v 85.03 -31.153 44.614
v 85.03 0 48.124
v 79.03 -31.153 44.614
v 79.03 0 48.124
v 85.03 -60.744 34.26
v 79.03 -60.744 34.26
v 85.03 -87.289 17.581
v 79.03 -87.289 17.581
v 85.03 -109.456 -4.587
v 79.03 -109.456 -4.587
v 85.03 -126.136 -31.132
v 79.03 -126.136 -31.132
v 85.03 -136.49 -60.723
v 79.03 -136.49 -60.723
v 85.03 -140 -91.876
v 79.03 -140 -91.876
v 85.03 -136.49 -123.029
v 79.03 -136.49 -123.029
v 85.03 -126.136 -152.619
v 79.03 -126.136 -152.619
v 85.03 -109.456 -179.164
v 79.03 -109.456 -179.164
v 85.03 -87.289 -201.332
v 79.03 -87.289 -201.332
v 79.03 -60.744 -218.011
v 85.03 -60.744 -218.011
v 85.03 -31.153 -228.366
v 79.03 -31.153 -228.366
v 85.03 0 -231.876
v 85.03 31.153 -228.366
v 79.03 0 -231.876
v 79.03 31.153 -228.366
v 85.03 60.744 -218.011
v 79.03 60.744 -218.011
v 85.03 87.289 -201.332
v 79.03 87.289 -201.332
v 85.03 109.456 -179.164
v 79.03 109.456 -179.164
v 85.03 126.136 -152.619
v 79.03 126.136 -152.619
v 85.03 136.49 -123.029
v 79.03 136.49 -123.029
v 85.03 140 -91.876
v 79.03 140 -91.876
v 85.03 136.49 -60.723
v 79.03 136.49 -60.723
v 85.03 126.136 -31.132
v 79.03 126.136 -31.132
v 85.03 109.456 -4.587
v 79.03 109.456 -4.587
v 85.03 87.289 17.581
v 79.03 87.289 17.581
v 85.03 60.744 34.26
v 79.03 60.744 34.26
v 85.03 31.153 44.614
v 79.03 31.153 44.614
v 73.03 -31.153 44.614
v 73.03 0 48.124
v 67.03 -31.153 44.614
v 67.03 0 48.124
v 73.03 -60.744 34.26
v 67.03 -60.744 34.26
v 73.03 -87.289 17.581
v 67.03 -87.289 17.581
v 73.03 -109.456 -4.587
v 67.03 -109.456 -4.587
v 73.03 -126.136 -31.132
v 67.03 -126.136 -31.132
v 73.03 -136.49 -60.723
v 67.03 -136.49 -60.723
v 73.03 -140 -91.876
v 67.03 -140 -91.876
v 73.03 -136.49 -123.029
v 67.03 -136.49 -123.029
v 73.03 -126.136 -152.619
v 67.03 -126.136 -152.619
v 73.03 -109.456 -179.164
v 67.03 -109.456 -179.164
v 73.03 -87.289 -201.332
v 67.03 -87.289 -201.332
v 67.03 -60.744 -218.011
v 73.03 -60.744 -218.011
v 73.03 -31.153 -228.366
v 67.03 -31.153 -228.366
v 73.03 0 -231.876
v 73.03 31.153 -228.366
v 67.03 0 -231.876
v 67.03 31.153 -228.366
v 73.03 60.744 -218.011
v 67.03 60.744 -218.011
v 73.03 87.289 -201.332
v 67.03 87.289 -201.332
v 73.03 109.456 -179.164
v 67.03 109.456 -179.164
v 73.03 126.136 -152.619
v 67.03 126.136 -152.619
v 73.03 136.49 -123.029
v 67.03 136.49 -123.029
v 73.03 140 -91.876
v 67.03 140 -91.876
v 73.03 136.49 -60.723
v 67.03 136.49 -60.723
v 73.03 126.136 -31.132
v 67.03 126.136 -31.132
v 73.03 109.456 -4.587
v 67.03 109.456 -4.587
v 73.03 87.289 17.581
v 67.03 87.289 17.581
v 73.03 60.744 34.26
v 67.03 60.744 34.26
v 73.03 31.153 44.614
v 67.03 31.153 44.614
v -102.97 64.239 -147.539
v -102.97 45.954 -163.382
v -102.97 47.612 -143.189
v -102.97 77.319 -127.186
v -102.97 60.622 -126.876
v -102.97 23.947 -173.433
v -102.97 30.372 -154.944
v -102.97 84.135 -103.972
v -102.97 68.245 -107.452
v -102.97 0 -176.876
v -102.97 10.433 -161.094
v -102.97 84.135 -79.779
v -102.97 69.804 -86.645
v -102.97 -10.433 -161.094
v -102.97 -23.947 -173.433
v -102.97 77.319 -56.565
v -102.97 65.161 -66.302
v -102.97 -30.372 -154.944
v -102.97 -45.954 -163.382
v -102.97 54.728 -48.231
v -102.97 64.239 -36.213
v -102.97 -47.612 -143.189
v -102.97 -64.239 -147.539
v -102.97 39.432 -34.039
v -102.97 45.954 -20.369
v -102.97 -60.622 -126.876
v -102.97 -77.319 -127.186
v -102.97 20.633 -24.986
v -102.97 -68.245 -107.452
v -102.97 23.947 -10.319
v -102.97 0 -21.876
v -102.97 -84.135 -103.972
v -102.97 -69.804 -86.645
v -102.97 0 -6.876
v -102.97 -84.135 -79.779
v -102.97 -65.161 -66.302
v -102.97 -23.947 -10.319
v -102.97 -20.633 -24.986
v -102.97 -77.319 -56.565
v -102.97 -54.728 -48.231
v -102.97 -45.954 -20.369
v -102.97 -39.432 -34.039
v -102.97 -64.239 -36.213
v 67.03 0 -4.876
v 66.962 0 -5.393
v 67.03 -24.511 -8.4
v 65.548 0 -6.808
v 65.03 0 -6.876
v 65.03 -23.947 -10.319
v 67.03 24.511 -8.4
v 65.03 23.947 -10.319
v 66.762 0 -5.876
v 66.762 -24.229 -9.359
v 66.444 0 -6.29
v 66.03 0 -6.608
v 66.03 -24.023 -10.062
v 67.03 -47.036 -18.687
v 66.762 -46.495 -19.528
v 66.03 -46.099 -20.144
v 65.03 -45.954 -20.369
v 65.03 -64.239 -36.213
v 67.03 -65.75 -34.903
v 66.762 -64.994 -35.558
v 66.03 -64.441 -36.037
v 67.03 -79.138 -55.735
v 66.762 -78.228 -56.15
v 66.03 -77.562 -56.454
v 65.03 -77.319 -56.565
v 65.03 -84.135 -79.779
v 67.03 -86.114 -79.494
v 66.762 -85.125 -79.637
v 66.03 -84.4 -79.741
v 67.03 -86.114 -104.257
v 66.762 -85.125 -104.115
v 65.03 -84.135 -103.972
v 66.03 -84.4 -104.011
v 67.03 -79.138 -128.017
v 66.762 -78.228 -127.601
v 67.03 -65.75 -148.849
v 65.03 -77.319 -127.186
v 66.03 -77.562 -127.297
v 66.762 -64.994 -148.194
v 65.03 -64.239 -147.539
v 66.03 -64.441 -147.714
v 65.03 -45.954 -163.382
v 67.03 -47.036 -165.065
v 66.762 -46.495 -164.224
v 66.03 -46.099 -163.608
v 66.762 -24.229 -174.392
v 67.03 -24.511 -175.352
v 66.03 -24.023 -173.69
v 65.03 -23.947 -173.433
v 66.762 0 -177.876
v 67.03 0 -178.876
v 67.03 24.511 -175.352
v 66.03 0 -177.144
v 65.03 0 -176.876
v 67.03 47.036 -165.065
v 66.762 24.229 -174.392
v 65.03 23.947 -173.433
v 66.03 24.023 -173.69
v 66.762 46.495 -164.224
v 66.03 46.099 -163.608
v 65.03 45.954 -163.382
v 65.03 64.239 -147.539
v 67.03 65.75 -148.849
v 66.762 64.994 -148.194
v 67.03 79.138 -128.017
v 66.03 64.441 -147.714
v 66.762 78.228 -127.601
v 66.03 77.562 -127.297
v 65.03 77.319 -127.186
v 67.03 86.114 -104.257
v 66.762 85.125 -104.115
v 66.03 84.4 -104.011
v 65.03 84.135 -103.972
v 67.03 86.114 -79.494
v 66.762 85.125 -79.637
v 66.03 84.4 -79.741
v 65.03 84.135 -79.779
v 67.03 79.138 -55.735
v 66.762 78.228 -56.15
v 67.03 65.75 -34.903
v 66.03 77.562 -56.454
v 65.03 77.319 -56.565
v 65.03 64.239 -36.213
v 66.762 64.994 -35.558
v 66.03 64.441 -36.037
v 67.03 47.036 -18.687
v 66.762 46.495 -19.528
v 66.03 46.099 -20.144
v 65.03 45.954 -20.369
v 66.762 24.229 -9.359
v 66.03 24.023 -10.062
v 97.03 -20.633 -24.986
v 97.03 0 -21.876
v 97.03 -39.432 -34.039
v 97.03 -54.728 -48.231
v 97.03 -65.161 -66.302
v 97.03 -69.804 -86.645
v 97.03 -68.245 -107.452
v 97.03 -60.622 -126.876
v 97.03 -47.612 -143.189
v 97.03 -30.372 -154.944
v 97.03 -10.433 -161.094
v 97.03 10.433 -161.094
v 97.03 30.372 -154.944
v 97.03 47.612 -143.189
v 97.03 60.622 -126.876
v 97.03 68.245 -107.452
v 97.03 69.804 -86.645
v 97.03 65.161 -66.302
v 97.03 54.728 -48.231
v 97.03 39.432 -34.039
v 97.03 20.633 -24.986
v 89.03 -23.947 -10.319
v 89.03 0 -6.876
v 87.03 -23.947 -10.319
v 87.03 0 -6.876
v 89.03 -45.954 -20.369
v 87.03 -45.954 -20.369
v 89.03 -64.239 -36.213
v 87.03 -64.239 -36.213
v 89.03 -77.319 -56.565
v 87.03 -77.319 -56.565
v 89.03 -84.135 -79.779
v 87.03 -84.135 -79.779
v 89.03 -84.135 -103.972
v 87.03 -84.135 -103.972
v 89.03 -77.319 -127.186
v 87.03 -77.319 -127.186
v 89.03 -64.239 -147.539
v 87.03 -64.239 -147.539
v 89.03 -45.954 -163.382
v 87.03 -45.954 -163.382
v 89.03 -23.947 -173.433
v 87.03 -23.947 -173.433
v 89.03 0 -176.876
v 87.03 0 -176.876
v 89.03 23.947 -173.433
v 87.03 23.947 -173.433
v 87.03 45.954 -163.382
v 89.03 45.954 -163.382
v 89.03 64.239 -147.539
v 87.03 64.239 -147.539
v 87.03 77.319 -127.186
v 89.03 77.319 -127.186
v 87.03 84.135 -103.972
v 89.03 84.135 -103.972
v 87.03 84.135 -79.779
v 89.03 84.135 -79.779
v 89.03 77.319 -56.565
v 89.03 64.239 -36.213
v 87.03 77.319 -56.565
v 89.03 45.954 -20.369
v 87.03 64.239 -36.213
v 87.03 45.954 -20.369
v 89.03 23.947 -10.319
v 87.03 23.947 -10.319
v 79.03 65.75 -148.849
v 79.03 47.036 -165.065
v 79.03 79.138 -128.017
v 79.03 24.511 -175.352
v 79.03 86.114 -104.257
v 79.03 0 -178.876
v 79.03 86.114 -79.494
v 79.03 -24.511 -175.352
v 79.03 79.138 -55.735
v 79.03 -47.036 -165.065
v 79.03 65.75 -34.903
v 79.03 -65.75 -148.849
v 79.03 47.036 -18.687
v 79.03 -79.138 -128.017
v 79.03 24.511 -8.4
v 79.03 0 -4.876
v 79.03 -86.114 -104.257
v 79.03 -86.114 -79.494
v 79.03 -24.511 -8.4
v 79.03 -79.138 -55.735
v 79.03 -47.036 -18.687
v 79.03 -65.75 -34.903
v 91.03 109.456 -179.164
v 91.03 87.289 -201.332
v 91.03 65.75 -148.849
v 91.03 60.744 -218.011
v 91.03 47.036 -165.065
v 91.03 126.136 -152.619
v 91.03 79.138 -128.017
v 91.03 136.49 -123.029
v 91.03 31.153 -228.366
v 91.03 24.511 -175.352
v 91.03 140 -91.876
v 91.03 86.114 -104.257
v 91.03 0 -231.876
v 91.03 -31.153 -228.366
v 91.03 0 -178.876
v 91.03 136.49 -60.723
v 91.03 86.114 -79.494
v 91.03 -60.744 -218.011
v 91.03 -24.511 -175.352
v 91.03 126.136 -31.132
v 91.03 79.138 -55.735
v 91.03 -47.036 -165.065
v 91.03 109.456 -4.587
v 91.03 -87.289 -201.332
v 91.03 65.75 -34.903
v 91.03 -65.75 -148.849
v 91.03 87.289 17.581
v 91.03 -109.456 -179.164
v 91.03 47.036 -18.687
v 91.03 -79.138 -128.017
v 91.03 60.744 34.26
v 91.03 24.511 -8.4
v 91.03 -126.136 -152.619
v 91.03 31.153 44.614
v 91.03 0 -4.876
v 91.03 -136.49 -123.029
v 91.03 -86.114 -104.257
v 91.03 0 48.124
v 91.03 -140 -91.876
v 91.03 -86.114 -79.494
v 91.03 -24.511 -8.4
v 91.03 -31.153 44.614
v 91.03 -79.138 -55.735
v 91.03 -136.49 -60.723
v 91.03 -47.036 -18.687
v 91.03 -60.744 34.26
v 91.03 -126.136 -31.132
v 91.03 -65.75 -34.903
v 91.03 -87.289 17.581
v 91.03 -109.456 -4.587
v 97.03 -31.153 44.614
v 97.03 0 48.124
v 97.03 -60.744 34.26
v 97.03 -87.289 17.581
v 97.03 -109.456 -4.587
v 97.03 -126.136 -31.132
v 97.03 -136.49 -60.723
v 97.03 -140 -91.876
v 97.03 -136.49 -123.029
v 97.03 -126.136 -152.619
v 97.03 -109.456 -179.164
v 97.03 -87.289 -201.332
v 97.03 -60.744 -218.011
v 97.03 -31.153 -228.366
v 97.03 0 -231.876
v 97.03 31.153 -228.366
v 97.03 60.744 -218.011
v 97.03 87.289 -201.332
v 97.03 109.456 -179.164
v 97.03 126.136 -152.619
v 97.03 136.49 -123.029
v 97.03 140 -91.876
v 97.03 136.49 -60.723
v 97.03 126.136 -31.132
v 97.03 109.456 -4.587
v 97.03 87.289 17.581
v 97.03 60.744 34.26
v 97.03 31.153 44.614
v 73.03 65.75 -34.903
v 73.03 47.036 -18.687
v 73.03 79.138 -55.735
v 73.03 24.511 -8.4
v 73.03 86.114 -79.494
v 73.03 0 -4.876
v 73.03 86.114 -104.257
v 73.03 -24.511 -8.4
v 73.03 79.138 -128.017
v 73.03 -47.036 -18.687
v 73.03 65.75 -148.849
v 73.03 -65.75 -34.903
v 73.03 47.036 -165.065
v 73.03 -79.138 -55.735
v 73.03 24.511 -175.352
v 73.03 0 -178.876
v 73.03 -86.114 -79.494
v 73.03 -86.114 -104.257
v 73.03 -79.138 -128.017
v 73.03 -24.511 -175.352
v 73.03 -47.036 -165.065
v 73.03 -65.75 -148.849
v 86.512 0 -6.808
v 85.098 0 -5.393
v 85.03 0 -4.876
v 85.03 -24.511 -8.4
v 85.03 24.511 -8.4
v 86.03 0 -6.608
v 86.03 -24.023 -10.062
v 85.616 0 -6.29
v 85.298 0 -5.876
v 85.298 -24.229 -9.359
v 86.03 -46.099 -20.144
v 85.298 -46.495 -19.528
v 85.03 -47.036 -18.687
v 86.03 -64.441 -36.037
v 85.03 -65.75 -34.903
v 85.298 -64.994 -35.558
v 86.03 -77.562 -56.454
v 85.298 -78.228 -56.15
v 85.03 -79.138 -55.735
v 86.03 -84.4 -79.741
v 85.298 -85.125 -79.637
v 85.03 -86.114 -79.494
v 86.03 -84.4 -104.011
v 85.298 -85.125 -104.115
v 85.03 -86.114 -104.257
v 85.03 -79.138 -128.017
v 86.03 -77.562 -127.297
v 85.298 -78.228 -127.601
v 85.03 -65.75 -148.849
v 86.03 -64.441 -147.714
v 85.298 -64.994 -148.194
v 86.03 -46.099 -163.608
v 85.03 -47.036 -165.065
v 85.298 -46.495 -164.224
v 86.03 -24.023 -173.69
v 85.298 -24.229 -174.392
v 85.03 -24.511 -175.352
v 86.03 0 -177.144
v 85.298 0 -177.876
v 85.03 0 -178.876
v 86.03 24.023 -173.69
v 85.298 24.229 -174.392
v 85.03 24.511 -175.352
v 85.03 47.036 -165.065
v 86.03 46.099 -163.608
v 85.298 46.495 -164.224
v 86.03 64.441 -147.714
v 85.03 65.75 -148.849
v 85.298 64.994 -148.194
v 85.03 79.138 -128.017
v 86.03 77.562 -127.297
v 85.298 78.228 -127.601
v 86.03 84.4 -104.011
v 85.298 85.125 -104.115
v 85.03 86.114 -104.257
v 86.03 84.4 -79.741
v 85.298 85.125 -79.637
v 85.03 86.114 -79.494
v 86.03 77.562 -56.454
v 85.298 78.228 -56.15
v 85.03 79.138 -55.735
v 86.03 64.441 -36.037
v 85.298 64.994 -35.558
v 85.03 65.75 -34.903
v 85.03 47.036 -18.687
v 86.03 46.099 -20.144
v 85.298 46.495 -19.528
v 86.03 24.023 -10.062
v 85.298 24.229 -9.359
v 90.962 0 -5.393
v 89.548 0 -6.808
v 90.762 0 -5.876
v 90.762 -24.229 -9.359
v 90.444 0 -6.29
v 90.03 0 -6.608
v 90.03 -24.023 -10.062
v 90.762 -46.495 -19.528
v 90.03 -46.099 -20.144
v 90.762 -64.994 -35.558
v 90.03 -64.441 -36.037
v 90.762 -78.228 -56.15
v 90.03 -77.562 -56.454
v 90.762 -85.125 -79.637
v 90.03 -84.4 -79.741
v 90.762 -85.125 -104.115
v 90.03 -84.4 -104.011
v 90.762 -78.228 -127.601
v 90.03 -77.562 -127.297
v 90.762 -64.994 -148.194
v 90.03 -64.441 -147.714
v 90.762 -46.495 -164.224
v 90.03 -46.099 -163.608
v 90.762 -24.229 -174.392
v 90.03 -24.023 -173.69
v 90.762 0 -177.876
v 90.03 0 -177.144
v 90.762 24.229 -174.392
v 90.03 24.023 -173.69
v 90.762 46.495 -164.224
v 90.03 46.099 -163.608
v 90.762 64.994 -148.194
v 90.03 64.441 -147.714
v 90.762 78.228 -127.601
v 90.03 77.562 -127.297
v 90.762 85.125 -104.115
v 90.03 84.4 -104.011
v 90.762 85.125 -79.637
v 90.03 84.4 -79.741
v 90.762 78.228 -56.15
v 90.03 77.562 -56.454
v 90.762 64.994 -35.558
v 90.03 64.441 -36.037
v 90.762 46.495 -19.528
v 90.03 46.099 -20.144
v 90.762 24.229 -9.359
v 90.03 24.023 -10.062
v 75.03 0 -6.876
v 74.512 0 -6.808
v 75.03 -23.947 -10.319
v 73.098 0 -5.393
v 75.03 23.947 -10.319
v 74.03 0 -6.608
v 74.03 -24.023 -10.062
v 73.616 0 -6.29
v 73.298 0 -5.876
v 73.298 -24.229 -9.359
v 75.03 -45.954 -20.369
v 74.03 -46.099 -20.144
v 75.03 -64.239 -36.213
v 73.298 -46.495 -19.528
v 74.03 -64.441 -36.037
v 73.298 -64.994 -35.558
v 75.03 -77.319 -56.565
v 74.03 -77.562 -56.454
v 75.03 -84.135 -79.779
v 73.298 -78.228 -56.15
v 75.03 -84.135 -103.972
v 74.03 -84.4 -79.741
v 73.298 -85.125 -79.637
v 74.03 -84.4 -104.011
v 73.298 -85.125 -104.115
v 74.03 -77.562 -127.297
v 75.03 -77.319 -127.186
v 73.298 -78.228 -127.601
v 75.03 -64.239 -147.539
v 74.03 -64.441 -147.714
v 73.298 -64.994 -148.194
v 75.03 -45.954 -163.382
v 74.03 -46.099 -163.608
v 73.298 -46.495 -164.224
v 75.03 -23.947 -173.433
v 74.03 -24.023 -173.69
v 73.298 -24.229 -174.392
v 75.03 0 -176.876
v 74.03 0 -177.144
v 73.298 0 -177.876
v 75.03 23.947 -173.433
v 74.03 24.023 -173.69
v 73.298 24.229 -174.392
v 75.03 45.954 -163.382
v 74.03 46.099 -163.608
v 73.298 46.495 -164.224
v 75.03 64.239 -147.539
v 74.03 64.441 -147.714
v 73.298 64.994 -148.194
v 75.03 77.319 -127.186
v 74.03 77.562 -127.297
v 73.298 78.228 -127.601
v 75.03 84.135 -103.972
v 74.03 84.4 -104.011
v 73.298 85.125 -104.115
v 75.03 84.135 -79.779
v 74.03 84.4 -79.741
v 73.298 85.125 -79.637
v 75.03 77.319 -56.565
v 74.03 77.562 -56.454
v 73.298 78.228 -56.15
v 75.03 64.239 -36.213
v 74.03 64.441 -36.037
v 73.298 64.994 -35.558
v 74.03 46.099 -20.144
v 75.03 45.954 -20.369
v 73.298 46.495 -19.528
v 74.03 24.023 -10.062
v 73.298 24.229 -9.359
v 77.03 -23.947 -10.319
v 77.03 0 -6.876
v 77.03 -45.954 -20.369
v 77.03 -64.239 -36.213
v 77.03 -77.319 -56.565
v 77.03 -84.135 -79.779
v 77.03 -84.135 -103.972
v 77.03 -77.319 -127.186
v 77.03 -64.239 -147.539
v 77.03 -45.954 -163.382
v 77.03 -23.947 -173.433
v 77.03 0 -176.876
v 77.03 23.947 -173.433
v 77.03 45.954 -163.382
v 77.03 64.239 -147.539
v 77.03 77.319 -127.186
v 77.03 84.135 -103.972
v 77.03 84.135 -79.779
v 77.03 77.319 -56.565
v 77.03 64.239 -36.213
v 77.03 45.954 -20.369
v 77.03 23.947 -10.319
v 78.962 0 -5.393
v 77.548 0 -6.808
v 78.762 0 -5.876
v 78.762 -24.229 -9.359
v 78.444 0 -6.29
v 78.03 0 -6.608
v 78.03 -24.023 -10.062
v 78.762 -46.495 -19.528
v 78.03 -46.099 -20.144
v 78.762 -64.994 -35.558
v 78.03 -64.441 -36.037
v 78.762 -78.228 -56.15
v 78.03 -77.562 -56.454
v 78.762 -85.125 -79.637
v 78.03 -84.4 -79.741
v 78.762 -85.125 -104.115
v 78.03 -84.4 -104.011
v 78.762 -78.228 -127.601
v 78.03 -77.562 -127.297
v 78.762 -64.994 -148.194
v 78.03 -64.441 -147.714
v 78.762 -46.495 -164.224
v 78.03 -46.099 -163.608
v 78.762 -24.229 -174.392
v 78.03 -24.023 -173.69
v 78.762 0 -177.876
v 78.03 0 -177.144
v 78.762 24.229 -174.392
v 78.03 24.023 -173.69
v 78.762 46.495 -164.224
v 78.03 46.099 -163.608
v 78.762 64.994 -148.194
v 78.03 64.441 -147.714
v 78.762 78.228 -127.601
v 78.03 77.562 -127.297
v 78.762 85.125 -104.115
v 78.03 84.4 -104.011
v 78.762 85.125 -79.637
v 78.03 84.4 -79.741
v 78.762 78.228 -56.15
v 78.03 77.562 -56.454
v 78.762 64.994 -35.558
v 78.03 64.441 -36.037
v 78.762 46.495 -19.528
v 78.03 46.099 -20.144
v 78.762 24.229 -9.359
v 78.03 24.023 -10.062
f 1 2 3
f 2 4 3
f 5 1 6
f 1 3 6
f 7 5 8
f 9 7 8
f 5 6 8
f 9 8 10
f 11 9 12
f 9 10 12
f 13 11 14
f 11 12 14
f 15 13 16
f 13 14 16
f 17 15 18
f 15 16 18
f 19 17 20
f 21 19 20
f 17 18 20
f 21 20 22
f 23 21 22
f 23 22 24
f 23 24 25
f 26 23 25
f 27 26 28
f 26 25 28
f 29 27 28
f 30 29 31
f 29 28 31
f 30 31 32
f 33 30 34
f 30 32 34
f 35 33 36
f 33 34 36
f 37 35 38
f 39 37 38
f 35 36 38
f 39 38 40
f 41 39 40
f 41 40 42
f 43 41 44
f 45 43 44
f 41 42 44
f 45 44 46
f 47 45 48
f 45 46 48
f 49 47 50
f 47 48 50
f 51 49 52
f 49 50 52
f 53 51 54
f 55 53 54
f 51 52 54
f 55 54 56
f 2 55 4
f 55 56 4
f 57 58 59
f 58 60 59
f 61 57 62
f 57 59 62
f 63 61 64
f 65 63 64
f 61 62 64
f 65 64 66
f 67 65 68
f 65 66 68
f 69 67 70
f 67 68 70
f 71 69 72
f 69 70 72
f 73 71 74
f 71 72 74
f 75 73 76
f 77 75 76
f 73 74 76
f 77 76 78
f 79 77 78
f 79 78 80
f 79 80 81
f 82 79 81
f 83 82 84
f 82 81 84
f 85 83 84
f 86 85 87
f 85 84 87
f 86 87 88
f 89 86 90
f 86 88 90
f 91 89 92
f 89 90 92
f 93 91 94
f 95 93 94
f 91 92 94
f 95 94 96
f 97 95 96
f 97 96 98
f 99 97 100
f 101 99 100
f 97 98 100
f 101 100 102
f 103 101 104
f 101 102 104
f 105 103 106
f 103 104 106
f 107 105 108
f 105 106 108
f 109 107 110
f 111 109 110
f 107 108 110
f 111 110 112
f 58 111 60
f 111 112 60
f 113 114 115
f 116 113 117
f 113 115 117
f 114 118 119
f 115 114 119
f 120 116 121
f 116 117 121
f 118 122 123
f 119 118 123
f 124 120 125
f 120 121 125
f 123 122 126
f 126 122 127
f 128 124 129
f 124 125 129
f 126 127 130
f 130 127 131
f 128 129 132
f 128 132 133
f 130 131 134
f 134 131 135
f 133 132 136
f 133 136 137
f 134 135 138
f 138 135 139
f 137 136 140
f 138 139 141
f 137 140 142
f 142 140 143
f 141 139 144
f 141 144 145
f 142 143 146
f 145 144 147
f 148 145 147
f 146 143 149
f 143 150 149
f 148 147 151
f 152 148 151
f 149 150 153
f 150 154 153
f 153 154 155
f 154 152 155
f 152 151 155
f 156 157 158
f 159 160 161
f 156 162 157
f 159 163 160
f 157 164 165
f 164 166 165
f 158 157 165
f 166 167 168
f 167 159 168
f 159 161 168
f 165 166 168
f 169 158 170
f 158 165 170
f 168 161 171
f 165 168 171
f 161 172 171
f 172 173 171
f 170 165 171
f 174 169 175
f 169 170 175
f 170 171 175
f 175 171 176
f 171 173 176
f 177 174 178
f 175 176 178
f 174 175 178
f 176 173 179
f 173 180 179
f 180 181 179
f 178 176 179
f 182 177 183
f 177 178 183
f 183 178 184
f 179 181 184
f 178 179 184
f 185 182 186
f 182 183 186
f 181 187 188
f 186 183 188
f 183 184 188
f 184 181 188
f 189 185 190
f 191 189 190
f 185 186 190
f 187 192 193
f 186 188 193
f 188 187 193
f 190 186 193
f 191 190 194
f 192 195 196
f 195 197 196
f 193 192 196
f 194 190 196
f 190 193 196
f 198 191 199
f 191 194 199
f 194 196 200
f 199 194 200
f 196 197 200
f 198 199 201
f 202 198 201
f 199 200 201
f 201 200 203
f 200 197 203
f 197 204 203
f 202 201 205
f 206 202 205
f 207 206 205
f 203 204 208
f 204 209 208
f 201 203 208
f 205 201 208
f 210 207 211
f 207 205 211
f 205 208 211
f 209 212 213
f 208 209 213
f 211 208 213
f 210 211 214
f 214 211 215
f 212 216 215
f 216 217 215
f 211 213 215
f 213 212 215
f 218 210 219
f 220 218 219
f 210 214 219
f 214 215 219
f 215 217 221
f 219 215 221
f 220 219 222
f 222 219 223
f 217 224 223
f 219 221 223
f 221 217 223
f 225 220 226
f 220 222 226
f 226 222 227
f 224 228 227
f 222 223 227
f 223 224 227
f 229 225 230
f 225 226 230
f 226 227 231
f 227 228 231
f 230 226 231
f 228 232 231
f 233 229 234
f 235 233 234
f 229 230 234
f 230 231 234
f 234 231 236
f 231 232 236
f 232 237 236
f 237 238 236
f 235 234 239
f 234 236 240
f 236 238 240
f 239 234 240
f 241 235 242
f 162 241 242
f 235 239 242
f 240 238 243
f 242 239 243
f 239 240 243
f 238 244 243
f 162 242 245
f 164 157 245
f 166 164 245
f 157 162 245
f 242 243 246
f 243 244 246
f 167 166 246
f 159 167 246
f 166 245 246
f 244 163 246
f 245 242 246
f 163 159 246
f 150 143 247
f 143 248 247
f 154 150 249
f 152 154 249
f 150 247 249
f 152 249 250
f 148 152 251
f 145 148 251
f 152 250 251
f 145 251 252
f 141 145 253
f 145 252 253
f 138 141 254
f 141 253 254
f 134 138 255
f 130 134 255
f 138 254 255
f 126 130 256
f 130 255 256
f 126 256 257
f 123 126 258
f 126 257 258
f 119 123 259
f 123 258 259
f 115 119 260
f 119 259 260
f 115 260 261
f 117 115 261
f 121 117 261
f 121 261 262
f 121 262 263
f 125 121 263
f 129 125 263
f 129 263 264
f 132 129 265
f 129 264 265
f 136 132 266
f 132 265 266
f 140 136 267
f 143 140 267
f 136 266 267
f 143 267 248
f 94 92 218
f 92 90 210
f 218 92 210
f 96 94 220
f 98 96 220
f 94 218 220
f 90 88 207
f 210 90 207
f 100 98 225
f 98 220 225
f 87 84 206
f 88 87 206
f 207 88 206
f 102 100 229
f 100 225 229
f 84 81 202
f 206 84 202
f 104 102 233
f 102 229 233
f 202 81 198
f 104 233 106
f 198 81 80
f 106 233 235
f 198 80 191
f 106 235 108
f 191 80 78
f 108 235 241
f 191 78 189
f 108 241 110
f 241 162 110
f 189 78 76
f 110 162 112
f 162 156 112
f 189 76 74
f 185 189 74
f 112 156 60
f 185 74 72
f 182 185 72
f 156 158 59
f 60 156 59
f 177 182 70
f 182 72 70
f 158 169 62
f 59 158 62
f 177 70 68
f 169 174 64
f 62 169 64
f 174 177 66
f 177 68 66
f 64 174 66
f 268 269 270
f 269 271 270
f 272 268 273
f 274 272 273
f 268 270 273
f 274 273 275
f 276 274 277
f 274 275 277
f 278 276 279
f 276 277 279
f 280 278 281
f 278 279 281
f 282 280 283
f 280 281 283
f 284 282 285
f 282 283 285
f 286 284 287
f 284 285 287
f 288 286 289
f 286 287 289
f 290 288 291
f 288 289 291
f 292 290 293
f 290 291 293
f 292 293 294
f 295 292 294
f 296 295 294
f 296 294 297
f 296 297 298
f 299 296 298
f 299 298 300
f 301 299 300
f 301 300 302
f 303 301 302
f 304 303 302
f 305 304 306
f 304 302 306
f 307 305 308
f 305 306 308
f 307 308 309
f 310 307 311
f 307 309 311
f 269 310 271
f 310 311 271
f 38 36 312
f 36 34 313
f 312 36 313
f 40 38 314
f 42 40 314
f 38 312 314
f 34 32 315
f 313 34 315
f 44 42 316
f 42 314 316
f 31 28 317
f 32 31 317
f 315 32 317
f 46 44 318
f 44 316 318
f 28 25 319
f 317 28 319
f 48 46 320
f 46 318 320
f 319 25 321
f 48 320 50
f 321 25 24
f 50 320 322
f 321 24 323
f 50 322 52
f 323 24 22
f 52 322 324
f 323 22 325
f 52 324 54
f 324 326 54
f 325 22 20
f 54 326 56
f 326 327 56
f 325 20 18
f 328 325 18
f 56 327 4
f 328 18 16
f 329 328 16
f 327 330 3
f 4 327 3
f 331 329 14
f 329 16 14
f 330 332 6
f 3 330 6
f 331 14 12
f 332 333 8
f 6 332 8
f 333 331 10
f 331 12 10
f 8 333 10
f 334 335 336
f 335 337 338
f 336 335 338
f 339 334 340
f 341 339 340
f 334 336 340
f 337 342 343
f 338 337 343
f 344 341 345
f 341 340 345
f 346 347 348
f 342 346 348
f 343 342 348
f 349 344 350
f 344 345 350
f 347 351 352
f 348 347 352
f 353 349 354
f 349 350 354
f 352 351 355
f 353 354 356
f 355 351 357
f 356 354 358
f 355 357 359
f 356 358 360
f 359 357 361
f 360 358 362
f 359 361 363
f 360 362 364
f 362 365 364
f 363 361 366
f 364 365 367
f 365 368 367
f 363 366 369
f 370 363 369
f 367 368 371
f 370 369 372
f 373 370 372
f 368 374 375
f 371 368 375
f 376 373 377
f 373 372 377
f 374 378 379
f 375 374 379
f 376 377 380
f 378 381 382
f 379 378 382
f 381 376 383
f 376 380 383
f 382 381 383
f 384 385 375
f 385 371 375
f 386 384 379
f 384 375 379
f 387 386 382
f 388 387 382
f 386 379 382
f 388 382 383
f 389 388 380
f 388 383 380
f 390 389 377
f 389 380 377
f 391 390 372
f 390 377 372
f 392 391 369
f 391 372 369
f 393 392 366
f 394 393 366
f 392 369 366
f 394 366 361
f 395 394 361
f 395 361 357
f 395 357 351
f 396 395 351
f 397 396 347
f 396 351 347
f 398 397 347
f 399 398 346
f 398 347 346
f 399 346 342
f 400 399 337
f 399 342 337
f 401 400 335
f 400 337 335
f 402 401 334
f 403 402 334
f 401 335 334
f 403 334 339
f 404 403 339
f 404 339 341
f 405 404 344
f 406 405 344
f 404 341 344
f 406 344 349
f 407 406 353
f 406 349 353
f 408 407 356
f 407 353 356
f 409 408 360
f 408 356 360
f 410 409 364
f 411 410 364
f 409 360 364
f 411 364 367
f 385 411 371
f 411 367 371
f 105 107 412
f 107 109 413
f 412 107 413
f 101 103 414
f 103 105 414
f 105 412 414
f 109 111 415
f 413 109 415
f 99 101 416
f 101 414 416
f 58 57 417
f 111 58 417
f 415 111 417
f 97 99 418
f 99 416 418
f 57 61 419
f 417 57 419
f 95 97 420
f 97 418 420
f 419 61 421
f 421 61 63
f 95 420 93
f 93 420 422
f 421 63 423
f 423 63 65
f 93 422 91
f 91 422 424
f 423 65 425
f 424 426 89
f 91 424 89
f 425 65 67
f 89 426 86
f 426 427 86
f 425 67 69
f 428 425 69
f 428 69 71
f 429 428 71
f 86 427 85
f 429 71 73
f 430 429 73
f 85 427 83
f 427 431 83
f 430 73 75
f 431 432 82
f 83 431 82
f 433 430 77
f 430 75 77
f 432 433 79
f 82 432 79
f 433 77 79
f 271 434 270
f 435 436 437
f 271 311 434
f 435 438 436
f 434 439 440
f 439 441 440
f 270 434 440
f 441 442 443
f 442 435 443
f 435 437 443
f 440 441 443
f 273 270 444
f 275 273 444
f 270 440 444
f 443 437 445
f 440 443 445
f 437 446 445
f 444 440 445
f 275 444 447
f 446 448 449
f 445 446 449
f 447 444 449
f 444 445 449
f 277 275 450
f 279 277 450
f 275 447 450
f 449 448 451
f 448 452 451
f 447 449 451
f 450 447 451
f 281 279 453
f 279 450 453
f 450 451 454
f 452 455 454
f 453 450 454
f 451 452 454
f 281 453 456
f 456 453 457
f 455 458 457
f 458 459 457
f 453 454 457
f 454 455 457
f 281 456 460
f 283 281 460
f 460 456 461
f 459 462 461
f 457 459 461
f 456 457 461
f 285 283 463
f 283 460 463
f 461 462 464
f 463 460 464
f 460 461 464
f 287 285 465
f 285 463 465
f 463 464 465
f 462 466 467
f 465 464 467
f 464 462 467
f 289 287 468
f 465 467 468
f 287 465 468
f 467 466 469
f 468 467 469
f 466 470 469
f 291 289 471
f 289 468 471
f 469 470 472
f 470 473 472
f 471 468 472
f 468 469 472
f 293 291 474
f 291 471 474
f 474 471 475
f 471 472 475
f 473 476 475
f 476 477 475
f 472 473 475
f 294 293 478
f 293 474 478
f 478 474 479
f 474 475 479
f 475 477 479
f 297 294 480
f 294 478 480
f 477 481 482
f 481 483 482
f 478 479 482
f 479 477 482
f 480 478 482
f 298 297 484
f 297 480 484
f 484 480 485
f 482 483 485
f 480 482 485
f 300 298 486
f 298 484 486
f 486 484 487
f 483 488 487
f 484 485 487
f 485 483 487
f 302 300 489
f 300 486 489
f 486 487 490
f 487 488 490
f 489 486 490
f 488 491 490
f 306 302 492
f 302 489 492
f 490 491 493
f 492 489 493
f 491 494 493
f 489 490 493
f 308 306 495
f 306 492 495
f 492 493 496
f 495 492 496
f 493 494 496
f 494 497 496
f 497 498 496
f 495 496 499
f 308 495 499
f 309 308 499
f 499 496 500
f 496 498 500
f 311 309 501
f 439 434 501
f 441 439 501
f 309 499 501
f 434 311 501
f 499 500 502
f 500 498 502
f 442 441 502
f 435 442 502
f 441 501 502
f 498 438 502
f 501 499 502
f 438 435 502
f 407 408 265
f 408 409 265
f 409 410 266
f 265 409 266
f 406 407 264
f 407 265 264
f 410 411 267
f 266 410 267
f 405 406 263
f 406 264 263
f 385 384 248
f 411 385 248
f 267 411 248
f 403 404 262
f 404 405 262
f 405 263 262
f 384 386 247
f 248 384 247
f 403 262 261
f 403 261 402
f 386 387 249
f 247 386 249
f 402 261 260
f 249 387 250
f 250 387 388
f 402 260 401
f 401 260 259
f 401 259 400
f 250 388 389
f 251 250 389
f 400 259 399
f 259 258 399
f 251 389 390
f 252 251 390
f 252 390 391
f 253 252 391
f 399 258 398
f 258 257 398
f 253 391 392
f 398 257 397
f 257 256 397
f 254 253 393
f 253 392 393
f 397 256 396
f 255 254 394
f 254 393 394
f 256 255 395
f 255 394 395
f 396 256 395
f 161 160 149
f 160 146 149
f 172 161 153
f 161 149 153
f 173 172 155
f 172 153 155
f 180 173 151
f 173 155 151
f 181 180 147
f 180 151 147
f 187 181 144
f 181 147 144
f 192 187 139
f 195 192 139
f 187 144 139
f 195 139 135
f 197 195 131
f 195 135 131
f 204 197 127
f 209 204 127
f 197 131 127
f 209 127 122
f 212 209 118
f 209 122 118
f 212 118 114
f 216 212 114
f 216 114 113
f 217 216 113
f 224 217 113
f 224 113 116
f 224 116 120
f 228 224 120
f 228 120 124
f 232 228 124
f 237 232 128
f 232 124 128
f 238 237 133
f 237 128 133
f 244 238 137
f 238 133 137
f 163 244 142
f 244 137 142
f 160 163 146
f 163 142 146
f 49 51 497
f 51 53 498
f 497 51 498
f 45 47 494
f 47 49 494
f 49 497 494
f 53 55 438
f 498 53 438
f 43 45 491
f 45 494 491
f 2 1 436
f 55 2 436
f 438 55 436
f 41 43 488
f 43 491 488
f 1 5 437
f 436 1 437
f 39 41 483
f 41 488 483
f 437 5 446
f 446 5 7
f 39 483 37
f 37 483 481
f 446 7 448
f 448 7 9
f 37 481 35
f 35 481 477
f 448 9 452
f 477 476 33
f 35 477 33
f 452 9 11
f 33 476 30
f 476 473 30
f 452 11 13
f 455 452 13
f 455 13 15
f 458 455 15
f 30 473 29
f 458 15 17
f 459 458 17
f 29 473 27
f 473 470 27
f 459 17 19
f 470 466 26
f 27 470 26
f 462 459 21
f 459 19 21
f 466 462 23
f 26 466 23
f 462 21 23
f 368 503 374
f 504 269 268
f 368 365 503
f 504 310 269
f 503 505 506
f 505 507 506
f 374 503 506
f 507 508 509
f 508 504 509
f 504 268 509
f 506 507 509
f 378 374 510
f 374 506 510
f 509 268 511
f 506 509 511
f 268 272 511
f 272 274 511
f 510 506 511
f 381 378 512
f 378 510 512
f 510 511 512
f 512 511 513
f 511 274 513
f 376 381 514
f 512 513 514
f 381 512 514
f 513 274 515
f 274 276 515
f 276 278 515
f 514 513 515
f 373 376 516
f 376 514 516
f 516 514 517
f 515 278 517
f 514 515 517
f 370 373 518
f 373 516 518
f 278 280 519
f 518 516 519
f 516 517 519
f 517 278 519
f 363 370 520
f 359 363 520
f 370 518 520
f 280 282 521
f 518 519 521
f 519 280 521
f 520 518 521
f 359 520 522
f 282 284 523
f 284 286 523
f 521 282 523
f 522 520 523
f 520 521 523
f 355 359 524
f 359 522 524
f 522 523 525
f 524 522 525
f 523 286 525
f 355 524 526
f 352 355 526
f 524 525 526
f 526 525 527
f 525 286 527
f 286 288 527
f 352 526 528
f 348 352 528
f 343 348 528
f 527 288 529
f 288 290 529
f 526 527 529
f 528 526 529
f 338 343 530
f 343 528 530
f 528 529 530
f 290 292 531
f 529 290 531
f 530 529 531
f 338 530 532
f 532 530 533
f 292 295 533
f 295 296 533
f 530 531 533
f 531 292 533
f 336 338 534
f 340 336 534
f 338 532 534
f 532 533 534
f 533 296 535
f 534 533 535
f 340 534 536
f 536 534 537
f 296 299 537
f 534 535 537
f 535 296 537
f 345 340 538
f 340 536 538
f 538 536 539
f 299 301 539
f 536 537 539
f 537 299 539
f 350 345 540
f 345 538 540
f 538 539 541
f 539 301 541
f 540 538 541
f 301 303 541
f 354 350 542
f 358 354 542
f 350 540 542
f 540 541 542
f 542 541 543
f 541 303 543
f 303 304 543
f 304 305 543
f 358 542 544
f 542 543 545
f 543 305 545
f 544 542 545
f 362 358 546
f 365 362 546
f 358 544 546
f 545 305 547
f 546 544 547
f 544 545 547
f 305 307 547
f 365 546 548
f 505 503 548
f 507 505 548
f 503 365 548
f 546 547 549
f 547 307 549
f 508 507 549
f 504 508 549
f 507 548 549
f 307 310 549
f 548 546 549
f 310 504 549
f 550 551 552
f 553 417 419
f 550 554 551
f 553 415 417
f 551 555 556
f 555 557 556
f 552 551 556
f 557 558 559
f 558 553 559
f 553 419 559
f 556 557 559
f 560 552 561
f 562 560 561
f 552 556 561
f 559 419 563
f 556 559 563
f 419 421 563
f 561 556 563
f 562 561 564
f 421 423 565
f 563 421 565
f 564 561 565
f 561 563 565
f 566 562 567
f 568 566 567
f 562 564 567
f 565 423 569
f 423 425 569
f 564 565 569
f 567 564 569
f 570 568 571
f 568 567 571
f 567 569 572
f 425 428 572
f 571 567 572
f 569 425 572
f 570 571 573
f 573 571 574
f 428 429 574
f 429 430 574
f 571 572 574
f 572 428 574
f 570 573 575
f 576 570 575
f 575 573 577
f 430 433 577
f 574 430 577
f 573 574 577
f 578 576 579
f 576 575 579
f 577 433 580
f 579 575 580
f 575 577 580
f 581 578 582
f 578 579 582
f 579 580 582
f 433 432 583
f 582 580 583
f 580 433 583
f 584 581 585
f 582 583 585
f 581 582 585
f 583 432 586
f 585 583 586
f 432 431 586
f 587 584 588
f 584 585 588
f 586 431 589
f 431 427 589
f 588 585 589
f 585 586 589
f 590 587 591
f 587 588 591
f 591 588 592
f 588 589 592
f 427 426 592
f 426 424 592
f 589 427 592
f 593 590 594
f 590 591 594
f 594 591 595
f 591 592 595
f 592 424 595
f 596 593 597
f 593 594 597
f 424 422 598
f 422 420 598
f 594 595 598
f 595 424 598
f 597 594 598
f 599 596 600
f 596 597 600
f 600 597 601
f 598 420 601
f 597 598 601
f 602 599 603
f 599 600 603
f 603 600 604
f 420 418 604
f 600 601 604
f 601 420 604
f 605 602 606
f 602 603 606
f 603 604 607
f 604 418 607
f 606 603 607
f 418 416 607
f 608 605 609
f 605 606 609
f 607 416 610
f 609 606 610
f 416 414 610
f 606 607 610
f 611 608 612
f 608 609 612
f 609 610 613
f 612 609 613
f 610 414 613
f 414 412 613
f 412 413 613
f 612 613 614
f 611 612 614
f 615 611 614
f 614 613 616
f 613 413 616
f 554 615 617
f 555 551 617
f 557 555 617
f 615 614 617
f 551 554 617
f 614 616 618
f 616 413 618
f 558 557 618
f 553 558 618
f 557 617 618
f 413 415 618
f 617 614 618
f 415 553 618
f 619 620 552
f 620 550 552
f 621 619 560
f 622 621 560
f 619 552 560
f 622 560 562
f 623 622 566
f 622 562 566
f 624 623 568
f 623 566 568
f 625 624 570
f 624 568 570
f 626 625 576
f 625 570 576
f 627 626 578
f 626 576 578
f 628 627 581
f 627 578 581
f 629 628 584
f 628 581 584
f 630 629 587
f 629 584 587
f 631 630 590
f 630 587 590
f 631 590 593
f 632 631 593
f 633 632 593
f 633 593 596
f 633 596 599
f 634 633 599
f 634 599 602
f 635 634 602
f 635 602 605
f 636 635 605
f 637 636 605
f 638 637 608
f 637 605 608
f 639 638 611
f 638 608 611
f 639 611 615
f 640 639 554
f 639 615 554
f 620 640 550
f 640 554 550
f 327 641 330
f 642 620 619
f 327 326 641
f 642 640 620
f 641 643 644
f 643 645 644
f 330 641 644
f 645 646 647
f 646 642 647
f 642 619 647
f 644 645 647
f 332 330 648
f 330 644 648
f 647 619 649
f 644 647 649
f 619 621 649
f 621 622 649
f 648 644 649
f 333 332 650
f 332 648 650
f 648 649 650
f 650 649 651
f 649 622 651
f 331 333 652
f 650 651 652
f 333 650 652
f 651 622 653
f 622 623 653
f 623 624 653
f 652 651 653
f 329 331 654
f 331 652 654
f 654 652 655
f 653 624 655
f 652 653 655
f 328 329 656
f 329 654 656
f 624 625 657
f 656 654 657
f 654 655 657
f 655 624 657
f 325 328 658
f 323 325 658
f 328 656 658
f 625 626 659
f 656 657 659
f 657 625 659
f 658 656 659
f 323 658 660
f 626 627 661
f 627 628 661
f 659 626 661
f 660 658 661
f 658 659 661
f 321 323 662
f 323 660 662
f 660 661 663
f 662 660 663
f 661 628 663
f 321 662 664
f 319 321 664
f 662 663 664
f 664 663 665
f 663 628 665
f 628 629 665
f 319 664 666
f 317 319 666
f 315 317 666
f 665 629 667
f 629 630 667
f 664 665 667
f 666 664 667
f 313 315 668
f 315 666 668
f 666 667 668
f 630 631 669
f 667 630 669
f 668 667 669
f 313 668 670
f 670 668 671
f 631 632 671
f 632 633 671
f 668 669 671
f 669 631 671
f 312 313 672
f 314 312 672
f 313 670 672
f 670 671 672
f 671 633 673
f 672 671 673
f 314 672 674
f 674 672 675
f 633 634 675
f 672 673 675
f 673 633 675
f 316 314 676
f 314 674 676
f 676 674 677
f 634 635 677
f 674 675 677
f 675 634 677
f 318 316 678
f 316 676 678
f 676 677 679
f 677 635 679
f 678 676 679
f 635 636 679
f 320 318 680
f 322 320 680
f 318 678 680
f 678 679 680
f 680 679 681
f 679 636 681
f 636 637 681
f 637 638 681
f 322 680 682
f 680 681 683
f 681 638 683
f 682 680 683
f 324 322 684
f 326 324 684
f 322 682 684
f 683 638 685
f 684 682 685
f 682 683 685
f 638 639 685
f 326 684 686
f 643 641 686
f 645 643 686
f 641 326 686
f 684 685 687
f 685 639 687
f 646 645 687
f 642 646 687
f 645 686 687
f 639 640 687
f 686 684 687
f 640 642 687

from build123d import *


with BuildPart() as f1:
    # F0 (on Front) → F1 (revolve)
    with BuildSketch(Plane.XZ):
        with BuildLine():
            Line((-102.970031, -6.875699), (-102.970031, -21.875699))
            Line((-102.970031, -21.875699), (97.029969, -21.875699))
            Line((97.029969, -21.875699), (97.029969, 48.124301))
            Line((97.029969, 48.124301), (91.029969, 48.124301))
            Line((91.029969, 48.124301), (91.029969, -4.875699))
            ThreePointArc((91.029969, -4.875699), (90.444182, -6.289912), (89.029969, -6.875699))
            Line((89.029969, -6.875699), (87.029969, -6.875699))
            ThreePointArc((87.029969, -6.875699), (85.615755, -6.289912), (85.029969, -4.875699))
            Line((85.029969, -4.875699), (85.029969, 48.124301))
            Line((85.029969, 48.124301), (79.029969, 48.124301))
            Line((79.029969, 48.124301), (79.029969, -4.875699))
            ThreePointArc((79.029969, -4.875699), (78.444182, -6.289912), (77.029969, -6.875699))
            Line((77.029969, -6.875699), (75.029969, -6.875699))
            ThreePointArc((75.029969, -6.875699), (73.615755, -6.289912), (73.029969, -4.875699))
            Line((73.029969, -4.875699), (73.029969, 48.124301))
            Line((73.029969, 48.124301), (67.029969, 48.124301))
            Line((67.029969, 48.124301), (67.029969, -4.875699))
            ThreePointArc((67.029969, -4.875699), (66.444182, -6.289912), (65.029969, -6.875699))
            Line((65.029969, -6.875699), (-102.970031, -6.875699))
        make_face()
    revolve(axis=Axis((-4.417114, 0, -91.875699), (1, 0, 0)))


solid = f1.part
